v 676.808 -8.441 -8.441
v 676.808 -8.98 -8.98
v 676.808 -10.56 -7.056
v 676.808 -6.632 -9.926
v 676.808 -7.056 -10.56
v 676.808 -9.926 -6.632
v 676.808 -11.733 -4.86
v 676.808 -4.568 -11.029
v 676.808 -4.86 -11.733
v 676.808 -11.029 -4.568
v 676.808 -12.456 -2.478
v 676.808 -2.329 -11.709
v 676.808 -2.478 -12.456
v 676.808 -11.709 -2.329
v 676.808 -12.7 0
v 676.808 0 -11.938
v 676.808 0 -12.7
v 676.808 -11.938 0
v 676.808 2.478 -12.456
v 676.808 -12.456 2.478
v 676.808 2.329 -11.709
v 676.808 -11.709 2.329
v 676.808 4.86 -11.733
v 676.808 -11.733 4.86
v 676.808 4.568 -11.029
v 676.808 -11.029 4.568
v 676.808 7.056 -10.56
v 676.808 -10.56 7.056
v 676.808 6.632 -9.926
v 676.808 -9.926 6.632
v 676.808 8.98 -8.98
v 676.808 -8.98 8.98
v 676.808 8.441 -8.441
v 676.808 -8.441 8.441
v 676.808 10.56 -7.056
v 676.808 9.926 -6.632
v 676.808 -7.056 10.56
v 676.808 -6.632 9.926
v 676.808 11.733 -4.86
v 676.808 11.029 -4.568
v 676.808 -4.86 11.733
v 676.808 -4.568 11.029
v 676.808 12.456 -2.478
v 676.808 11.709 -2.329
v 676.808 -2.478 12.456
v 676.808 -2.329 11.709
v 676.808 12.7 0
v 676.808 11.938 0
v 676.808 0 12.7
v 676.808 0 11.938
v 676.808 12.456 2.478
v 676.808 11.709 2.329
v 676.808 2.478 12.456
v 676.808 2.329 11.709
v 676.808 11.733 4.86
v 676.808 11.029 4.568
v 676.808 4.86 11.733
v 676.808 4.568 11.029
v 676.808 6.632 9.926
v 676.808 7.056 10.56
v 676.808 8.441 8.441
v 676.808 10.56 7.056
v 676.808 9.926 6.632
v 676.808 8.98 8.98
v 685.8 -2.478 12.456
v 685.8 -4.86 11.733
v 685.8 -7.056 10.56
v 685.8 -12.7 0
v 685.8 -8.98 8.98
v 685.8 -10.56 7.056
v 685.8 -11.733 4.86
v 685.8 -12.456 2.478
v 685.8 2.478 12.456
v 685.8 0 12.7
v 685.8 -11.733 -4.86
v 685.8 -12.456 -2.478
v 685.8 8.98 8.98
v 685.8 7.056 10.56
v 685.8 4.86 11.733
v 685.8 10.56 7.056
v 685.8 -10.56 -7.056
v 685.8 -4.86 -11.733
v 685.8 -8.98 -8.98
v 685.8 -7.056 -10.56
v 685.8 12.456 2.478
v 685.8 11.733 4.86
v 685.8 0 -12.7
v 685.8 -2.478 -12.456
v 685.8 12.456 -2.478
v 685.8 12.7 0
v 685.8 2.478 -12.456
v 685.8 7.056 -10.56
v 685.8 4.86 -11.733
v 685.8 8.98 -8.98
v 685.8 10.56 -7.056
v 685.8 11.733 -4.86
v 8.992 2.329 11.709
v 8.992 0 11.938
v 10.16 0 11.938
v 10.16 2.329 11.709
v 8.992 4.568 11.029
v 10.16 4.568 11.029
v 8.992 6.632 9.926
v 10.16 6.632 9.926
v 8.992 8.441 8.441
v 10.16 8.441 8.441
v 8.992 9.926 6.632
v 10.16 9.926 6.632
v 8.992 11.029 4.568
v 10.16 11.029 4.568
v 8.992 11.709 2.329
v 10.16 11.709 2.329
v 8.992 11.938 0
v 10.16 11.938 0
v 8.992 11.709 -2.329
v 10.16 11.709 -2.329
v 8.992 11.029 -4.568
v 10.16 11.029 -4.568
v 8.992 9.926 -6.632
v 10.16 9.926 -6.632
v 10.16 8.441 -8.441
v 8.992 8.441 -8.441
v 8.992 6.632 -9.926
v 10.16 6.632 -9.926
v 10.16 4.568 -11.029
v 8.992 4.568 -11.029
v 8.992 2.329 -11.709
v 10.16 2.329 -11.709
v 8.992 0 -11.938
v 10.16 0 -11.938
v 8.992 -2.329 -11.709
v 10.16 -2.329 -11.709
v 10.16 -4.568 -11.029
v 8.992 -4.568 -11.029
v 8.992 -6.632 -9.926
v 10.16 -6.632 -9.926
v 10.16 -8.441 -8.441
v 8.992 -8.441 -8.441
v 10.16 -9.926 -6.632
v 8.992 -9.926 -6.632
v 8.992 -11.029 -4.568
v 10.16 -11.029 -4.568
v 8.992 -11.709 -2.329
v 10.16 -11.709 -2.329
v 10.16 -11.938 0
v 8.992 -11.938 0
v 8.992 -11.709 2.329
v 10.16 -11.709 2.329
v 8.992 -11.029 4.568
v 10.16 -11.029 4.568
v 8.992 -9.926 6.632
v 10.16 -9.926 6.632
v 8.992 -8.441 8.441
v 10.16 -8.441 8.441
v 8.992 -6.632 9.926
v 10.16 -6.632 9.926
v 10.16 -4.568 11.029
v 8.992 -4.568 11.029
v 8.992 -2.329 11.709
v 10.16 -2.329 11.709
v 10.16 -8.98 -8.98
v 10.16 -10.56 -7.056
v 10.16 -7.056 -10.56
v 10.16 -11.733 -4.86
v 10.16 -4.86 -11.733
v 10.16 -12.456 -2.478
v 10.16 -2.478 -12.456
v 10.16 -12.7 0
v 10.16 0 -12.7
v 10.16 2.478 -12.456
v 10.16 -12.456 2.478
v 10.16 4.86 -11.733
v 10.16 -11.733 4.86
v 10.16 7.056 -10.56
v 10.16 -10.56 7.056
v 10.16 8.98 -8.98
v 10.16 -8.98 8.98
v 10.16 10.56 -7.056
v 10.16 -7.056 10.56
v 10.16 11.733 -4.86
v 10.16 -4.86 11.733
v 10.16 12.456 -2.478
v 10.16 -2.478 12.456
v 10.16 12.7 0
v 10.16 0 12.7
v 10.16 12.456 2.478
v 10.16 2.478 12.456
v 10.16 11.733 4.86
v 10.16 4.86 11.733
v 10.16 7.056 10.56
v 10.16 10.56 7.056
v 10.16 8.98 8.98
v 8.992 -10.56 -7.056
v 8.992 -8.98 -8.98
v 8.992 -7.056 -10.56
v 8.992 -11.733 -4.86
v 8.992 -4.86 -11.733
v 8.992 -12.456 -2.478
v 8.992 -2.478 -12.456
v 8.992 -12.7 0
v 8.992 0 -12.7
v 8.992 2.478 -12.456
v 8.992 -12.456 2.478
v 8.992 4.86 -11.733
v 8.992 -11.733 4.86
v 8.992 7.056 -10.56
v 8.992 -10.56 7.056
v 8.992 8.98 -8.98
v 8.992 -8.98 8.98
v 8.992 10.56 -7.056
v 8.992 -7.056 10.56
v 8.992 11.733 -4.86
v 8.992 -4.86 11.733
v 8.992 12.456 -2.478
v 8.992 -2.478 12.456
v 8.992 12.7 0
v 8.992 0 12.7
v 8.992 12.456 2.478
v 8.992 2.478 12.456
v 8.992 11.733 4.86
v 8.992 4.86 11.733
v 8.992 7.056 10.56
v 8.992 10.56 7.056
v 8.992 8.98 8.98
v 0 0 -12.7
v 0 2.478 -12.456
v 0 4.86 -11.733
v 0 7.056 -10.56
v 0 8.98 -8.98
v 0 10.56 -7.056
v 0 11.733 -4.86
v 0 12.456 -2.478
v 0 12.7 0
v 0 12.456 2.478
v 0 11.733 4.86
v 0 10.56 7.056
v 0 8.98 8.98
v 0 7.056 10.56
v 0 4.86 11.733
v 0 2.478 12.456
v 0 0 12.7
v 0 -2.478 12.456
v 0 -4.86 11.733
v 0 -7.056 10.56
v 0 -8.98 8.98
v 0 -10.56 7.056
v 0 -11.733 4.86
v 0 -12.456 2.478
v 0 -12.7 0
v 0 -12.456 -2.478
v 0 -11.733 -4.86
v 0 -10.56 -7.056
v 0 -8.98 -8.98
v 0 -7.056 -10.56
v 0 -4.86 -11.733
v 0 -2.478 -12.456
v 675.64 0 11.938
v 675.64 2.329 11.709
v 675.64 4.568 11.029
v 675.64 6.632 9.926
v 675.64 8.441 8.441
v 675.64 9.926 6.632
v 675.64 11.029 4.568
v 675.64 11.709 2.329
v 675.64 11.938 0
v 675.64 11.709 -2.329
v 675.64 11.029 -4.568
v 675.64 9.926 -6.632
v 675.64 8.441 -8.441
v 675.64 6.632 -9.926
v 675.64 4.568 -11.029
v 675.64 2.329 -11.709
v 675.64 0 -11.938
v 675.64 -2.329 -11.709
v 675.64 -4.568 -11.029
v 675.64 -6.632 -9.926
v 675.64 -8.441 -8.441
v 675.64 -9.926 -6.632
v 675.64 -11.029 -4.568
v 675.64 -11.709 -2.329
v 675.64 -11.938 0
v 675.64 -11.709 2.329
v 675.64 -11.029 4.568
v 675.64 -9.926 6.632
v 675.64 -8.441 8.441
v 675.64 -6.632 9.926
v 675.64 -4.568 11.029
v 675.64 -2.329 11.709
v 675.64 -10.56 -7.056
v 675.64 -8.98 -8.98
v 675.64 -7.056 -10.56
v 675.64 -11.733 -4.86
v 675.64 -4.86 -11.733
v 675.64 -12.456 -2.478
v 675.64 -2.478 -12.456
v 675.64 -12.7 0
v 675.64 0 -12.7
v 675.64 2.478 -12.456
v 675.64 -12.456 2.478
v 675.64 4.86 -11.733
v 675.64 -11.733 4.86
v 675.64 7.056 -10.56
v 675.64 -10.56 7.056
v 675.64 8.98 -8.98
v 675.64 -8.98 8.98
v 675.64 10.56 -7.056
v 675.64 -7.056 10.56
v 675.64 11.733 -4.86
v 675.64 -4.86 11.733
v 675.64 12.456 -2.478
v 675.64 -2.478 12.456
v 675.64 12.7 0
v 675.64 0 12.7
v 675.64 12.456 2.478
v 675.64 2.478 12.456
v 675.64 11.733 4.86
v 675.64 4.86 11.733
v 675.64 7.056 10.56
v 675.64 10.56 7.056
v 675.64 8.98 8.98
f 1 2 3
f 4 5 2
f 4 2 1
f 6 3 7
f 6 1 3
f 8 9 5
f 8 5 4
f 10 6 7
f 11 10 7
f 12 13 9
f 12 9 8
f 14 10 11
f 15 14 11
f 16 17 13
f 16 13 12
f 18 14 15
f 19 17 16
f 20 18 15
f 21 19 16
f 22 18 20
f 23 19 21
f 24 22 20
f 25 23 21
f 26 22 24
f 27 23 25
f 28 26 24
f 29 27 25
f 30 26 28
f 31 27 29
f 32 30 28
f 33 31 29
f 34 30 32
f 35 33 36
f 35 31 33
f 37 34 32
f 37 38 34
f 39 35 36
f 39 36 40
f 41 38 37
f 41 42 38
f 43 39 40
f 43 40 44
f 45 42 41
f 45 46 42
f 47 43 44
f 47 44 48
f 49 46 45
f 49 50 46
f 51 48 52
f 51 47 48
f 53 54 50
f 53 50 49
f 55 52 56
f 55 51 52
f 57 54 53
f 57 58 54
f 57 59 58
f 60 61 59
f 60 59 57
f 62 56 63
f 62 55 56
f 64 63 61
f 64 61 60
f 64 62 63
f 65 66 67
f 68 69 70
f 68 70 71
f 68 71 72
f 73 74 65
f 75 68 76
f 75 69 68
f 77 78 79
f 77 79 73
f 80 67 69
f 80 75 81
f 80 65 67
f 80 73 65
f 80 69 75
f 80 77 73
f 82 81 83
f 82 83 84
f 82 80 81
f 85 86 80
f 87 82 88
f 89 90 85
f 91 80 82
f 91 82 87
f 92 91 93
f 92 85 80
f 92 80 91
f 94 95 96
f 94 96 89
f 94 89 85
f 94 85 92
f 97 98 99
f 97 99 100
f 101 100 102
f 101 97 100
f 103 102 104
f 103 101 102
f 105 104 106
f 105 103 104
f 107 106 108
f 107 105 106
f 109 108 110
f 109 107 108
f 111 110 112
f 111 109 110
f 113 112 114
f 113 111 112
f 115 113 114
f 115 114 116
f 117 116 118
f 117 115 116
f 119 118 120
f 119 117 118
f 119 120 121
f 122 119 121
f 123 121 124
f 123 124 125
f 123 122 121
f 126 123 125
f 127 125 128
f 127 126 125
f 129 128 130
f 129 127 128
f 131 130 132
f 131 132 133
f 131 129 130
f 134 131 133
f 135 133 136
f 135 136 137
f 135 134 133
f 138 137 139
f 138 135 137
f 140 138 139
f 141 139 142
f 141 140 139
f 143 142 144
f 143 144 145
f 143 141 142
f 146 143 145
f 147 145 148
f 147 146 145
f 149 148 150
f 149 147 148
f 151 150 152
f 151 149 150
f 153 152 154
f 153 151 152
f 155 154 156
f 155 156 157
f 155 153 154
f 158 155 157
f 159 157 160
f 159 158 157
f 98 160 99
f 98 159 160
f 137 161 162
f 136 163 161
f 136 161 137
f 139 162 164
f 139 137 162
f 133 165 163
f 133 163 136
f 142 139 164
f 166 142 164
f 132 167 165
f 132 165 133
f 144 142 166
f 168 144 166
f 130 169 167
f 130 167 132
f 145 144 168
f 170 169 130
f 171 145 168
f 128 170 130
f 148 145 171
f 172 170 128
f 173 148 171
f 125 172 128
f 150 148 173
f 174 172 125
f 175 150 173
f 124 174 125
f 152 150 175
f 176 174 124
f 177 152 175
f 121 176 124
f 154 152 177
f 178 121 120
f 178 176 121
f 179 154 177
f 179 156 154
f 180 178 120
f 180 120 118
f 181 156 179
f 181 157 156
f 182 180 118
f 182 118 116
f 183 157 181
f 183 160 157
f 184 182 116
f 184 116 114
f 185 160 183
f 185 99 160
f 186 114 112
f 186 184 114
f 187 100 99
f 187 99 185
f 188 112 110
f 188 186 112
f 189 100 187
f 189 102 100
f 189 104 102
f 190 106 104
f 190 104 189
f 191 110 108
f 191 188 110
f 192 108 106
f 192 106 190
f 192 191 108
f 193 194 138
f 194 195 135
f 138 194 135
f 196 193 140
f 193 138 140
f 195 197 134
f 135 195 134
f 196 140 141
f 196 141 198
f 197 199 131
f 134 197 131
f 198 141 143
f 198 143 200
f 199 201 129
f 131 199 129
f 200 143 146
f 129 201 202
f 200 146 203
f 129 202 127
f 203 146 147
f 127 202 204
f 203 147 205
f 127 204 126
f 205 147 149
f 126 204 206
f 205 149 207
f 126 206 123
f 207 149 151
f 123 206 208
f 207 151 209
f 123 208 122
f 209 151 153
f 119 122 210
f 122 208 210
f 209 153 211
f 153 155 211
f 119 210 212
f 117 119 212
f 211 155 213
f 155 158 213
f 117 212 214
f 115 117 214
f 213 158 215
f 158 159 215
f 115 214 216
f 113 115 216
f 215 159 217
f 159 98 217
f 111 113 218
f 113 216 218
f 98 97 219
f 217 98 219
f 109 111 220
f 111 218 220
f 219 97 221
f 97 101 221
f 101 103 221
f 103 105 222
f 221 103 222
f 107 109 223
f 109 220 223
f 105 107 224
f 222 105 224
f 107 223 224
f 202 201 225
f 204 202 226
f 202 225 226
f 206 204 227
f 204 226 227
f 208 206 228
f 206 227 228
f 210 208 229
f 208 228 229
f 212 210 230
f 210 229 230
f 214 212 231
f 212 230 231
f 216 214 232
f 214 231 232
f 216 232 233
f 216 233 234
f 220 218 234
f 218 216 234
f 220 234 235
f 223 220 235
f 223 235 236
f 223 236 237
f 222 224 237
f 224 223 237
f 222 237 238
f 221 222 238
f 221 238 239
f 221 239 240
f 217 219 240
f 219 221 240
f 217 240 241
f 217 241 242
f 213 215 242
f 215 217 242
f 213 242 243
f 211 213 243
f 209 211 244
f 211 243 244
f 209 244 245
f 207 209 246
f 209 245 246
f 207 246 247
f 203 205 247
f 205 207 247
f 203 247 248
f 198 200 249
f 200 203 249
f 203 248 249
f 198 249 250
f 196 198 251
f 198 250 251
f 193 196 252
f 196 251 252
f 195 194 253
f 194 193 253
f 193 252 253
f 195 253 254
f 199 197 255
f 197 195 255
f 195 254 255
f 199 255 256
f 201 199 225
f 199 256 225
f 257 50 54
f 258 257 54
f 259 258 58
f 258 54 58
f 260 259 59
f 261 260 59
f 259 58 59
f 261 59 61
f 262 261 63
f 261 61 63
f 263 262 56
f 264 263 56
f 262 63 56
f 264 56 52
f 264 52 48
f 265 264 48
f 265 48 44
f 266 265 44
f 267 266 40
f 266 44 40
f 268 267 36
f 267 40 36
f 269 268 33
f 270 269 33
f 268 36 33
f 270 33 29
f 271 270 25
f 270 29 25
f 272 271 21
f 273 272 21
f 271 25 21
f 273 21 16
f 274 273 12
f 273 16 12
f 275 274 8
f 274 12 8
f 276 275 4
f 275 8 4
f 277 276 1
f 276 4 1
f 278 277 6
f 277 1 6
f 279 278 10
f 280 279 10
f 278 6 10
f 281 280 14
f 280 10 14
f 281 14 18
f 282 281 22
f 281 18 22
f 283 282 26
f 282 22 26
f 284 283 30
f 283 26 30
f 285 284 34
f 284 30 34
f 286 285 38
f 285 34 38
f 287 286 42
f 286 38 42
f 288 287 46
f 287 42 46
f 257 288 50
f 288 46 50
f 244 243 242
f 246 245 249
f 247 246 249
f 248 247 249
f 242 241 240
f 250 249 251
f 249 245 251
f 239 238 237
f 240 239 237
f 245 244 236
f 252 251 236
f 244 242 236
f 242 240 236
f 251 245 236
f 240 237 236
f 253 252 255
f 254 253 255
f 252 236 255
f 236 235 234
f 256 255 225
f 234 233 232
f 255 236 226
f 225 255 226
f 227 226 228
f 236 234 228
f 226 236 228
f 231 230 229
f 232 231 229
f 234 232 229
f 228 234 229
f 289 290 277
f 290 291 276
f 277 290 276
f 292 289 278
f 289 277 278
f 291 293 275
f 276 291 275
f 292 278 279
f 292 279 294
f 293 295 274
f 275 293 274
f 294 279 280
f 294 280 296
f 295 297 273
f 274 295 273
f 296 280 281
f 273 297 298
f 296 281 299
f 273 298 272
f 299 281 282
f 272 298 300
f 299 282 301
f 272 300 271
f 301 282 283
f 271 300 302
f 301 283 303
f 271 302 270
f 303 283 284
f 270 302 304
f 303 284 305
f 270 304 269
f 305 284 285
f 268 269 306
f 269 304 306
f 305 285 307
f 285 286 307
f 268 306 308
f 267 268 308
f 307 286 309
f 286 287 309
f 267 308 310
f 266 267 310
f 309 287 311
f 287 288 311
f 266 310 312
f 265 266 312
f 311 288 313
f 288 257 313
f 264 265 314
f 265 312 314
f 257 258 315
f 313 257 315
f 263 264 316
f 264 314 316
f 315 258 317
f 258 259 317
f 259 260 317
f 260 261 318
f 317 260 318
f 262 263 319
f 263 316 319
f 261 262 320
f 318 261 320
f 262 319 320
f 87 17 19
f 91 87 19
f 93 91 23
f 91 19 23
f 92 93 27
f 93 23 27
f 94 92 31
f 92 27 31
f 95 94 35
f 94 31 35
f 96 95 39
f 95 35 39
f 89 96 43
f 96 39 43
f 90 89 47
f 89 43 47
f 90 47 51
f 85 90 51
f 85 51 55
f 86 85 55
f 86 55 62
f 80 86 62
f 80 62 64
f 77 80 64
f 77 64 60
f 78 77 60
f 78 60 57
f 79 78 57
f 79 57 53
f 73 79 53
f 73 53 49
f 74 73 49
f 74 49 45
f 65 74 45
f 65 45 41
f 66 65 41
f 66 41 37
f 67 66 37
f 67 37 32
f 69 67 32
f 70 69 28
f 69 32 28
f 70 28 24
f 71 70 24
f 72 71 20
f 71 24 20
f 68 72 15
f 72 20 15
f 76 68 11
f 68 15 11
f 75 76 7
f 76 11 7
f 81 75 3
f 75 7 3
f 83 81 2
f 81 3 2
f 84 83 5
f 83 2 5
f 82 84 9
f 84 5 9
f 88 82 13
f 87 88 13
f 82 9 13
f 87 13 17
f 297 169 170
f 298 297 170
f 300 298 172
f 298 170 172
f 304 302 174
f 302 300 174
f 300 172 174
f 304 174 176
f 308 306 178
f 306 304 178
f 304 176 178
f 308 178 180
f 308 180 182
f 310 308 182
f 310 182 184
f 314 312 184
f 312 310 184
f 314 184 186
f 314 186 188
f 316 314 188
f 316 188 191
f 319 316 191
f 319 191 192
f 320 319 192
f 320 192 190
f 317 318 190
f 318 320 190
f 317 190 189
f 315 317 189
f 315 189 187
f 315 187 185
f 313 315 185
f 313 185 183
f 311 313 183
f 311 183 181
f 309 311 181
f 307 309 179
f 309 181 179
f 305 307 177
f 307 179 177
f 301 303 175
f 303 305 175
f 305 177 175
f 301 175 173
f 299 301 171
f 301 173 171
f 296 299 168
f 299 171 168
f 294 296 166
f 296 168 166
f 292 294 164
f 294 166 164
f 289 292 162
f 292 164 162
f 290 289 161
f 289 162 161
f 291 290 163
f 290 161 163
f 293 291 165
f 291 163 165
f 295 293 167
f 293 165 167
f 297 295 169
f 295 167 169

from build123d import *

# Parameters (mm, degrees)
SKETCH1_R           = 12.7
BOSS_EXTRUDE1_DEPTH = 685.8
CUT_EXTRUDE1_START  = 1.1684
SKETCH2_R           = 12.7
SKETCH2_R_2         = 11.938
CUT_EXTRUDE1_DEPTH  = 1.1684


with BuildPart() as part:
    # Sketch1 → Boss-Extrude1 (new body)
    with BuildSketch(Plane(origin=(0, 0, 0), x_dir=(0, 0, -1), z_dir=(1, 0, 0))):
        Circle(SKETCH1_R)
    extrude(amount=BOSS_EXTRUDE1_DEPTH)

    # Sketch2 → Cut-Extrude1 (cut)
    with BuildSketch(Plane.ZY.offset(-10.16).offset(CUT_EXTRUDE1_START)):
        Circle(SKETCH2_R)
        Circle(SKETCH2_R_2, mode=Mode.SUBTRACT)
    cut_extrude1 = extrude(amount=-CUT_EXTRUDE1_DEPTH, mode=Mode.SUBTRACT)

    # Mirror1: Cut-Extrude1 across plane
    add(cut_extrude1.mirror(Plane.ZY.offset(-342.9)), mode=Mode.SUBTRACT)


solid = part.part
